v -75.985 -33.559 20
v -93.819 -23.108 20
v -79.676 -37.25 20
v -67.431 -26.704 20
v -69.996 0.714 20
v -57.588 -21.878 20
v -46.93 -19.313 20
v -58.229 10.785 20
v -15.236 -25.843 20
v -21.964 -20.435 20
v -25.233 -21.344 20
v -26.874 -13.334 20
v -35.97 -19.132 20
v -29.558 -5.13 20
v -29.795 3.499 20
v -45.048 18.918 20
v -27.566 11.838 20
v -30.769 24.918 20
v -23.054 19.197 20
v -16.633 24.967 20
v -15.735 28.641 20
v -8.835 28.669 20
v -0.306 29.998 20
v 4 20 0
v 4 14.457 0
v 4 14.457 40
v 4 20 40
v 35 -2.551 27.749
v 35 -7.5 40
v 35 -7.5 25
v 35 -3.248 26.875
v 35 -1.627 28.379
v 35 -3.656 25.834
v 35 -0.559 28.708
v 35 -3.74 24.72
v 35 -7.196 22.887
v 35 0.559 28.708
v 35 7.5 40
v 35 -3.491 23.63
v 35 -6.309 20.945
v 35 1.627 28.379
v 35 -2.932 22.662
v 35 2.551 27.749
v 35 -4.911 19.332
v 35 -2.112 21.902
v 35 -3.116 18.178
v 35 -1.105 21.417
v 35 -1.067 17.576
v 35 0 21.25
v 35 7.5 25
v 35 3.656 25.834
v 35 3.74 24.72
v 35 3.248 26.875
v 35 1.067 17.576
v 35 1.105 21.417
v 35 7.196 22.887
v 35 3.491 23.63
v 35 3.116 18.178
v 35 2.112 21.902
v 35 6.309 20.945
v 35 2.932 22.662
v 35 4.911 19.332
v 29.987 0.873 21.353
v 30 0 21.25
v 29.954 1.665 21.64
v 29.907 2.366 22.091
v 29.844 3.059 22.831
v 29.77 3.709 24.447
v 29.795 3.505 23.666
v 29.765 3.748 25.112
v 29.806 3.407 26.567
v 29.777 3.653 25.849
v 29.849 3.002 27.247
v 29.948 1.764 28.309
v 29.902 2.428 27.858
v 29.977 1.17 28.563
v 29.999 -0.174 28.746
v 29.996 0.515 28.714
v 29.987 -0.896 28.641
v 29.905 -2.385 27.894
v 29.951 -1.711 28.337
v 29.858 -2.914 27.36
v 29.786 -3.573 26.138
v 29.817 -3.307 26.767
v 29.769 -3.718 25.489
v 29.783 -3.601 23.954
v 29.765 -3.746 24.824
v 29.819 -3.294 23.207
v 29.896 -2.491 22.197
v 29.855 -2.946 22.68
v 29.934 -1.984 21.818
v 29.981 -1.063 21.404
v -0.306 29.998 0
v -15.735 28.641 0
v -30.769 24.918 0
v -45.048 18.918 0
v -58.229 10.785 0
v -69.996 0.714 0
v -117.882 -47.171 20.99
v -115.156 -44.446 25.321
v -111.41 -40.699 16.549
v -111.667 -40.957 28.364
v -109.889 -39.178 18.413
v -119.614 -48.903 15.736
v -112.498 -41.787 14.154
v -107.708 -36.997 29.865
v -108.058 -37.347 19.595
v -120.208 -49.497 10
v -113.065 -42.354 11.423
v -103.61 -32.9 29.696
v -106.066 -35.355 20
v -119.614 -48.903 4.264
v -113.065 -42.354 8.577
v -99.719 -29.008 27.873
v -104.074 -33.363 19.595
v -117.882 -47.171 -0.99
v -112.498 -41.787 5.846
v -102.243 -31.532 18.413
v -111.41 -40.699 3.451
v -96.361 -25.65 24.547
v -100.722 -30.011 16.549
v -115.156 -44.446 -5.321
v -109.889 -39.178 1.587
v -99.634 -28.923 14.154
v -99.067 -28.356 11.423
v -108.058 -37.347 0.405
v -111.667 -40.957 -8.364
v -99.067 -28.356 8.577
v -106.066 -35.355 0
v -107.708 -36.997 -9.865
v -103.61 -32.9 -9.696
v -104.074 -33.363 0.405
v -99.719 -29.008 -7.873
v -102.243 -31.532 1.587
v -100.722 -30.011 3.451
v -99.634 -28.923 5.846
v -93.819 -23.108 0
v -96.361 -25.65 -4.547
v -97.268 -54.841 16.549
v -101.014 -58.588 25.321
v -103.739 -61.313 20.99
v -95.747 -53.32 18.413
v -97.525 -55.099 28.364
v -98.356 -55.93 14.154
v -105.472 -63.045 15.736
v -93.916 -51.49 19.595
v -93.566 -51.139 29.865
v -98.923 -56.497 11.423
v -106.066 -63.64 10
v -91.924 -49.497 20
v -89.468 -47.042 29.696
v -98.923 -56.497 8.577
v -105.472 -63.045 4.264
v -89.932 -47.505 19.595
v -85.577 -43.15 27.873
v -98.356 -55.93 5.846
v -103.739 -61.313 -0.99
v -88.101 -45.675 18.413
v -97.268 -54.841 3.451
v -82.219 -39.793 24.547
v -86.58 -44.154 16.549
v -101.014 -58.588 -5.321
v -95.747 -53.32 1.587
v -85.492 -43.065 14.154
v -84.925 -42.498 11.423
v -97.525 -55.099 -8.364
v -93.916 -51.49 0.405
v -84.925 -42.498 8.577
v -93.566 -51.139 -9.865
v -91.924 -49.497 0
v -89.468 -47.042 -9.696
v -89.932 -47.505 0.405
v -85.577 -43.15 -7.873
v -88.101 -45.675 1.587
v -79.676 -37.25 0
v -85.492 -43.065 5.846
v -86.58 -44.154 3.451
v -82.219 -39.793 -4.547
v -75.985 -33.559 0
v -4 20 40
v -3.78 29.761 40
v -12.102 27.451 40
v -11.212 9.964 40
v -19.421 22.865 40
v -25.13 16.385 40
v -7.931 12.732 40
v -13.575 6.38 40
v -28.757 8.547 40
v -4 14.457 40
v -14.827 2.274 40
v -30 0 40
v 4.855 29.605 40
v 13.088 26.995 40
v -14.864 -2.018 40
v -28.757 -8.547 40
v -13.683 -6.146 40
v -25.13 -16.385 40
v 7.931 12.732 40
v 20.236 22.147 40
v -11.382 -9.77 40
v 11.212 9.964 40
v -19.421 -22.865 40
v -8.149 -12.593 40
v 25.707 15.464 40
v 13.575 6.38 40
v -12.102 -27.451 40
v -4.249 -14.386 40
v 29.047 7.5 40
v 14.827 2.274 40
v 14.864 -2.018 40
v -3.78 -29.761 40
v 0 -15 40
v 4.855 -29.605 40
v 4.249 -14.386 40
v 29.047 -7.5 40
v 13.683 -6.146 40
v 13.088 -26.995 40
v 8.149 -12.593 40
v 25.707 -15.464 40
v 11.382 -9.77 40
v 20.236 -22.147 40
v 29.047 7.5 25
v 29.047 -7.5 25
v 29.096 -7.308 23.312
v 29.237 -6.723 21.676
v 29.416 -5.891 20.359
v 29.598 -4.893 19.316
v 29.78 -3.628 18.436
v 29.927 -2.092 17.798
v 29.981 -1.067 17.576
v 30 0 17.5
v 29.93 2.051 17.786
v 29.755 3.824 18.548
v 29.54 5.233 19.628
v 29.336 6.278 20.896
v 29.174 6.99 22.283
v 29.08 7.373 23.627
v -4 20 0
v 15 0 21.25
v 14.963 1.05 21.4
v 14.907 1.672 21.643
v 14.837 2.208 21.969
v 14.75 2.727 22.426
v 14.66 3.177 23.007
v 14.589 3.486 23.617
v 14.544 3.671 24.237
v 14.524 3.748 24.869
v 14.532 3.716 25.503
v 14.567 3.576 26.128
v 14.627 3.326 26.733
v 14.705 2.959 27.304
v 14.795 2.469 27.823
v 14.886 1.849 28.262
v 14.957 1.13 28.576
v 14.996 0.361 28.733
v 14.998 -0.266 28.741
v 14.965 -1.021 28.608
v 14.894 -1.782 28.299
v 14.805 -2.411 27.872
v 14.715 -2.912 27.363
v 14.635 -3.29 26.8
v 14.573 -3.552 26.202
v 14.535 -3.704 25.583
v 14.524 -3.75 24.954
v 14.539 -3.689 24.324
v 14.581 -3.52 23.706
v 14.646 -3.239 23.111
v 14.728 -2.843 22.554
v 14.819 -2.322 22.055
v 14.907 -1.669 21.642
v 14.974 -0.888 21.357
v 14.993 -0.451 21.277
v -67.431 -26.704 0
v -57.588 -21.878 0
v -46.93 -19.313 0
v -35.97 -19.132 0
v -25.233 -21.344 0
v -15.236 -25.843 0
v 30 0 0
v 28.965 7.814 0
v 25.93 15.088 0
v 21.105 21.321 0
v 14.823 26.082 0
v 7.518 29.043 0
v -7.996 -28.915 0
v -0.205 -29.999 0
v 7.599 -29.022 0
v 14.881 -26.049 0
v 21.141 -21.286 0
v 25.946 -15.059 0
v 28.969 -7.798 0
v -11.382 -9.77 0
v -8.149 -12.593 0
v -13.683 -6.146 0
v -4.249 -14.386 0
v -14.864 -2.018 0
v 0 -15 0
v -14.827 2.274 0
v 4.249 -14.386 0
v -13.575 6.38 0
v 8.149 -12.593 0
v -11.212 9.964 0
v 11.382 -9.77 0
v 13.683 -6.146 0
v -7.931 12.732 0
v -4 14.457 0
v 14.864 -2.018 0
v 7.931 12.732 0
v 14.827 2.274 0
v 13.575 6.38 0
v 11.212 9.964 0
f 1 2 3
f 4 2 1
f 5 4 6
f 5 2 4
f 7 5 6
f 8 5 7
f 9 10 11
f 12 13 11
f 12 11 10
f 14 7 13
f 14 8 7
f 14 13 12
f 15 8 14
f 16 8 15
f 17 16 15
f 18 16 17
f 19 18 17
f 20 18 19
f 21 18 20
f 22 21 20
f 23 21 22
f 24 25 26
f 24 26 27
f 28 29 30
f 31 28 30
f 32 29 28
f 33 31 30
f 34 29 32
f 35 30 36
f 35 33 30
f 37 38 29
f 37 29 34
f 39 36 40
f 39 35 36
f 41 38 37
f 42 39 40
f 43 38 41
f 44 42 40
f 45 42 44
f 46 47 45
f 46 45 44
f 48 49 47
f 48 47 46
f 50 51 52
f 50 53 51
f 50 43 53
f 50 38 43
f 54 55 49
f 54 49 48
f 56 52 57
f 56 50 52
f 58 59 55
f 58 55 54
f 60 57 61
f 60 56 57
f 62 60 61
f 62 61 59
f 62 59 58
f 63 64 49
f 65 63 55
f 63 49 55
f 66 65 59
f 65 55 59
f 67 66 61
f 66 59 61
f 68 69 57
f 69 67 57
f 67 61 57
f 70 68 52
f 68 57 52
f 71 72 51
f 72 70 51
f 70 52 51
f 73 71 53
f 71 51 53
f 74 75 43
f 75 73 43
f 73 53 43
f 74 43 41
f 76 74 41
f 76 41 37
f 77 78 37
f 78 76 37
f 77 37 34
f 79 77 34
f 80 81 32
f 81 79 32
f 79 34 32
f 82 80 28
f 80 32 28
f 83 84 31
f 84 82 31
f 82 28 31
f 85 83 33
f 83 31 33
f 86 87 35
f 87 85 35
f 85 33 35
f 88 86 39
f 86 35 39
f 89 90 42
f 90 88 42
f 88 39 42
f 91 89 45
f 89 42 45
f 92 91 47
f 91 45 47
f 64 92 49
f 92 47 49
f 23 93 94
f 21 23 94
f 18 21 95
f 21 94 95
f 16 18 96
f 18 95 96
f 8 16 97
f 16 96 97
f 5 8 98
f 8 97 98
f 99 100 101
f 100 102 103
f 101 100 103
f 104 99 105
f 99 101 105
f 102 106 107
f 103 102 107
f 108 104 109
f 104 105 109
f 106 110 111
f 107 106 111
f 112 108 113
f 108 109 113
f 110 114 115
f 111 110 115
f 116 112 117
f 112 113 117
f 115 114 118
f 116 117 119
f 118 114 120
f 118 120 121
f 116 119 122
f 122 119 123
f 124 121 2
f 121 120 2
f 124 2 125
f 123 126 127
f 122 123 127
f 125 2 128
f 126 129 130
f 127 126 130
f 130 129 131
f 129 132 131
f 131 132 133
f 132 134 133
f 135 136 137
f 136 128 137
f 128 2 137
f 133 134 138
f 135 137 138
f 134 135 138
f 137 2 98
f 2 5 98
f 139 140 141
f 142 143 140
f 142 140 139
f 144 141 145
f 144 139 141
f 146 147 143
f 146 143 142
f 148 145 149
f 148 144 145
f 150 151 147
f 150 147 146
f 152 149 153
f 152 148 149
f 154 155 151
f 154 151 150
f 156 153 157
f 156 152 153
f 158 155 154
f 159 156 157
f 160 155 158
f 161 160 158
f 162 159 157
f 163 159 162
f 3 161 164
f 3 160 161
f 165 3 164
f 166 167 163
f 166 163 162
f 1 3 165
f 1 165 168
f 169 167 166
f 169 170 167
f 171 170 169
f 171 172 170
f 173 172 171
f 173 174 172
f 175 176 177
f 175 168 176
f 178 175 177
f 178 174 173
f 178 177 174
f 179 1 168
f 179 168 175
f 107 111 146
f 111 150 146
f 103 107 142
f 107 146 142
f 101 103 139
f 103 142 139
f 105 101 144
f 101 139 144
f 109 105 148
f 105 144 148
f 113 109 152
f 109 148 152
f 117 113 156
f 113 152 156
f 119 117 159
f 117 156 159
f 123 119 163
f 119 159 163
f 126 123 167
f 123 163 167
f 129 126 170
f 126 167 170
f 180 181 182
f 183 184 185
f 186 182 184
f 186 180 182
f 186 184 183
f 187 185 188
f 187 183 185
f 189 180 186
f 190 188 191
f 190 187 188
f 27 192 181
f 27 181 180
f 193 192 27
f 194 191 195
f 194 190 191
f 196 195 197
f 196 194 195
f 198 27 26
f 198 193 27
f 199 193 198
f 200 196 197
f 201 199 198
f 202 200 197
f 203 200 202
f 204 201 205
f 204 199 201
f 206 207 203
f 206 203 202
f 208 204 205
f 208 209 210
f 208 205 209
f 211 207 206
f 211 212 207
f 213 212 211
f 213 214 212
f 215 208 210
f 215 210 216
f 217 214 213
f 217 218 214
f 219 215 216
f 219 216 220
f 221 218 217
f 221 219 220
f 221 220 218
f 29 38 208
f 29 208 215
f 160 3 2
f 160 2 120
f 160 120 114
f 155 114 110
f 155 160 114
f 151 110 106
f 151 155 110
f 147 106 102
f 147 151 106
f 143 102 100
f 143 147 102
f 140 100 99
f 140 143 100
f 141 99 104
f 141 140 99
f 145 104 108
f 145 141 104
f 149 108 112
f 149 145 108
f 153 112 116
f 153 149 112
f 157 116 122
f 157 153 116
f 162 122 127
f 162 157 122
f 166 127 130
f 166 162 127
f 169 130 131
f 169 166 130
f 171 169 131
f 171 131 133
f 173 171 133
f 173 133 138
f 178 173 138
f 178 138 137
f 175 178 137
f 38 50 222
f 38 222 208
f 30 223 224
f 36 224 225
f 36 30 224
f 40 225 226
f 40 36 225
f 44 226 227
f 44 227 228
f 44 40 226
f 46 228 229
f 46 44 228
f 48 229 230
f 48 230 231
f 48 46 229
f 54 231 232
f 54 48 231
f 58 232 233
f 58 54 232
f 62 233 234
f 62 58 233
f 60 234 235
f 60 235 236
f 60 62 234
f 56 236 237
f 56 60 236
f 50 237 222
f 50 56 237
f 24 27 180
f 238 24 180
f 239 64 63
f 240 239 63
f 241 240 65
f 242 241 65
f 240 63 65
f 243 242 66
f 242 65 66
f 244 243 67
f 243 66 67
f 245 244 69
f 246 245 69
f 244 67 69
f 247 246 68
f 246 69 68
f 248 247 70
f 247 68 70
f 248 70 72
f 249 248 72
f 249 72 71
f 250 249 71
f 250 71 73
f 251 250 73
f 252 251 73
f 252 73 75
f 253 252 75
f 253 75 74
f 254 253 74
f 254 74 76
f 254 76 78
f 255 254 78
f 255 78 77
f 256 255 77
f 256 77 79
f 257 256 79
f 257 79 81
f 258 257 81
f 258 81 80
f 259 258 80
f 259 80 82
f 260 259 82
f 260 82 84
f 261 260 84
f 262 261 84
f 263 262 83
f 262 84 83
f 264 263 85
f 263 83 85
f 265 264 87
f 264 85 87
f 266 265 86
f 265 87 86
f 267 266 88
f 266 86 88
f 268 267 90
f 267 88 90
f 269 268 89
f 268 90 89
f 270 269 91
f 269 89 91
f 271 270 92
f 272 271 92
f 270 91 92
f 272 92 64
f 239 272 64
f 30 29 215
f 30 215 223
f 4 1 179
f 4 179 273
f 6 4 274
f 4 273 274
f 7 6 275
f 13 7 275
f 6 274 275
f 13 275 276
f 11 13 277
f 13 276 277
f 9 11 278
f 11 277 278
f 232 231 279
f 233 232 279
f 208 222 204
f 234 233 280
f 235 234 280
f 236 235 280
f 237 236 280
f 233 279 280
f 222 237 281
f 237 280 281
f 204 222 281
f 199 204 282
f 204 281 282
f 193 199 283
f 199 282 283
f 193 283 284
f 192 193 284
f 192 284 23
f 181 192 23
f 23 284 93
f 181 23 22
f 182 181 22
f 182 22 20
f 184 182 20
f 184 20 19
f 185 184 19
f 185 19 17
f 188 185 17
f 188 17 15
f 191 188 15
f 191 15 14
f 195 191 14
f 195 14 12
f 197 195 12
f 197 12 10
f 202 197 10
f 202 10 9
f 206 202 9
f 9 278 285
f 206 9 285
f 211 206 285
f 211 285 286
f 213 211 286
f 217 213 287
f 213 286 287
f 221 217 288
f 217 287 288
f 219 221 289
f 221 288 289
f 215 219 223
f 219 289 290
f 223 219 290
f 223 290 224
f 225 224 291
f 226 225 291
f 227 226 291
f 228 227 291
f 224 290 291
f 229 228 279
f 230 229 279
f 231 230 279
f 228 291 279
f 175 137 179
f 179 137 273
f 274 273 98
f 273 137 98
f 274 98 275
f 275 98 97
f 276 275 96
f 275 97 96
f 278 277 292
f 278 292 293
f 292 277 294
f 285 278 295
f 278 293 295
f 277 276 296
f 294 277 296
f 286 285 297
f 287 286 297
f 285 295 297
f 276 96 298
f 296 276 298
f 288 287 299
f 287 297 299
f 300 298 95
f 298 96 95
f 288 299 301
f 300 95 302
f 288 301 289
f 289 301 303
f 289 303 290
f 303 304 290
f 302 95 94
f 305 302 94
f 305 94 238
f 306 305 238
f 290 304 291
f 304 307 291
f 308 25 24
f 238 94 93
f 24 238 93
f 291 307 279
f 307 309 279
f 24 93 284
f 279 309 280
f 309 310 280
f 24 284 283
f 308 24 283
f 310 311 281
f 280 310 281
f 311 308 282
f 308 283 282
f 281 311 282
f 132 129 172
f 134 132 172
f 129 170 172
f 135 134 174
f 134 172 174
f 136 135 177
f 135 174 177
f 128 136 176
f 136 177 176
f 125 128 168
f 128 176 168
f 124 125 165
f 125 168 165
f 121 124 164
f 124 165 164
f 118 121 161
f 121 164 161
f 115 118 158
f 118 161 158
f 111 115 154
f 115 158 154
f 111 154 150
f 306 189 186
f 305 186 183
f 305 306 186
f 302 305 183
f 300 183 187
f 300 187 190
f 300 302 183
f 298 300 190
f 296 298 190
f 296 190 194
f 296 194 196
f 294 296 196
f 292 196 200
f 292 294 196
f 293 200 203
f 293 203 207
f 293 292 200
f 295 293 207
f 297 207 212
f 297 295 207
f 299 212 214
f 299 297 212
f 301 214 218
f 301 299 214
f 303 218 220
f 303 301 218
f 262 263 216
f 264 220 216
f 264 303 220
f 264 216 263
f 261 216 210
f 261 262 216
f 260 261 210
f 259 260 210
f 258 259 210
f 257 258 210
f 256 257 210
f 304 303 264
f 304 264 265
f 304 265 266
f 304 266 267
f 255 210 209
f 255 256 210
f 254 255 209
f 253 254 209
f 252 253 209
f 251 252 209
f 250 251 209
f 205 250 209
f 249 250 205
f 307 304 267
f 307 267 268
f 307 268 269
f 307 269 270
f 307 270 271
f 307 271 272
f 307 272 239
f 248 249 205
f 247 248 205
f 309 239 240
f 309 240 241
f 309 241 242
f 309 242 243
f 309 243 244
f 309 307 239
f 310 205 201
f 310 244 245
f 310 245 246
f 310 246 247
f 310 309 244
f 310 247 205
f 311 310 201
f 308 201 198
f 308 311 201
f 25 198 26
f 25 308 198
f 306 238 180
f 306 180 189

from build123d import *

# Parameters (mm, degrees)
SKETCH_1_R           = 30
EXTRUDE_1_DEPTH      = 40
EXTRUDE_2_DEPTH      = 20
SKETCH_2_R           = 20
SKETCH_2_R_2         = 10
EXTRUDE_3_DEPTH      = 20
CUT_EXTRUDE_1_DEPTH  = 20
EXTRUDE_4_REACH      = 174.452
EXTRUDE_4_END_RADIUS = 30
SKETCH_3_R           = 3.75
CUT_EXTRUDE_2_REACH  = 174.452
SKETCH_3_2_R         = 3.75


with BuildPart() as part:
    # 草图1 → 凸台-拉伸1 (new body)
    with BuildSketch(Plane.XY):
        Circle(SKETCH_1_R)
        with BuildLine():
            ThreePointArc((-4, 14.456832295), (0, -15), (4, 14.456832295))
            Line((4, 14.456832295), (4, 20))
            Line((4, 20), (-4, 20))
            Line((-4, 20), (-4, 14.456832295))
        make_face(mode=Mode.SUBTRACT)
    extrude(amount=EXTRUDE_1_DEPTH)

    # 草图1<3> → 凸台-拉伸2 (add)
    with BuildSketch(Plane.XY):
        with BuildLine():
            Line((-69.996355211, 0.714322908), (-106.066017178, -35.355339059))
            Line((-106.066017178, -35.355339059), (-91.923881554, -49.497474683))
            Line((-91.923881554, -49.497474683), (-75.985459186, -33.559052315))
            ThreePointArc((-75.985459186, -33.559052315), (-46.930334751, -19.312906561), (-15.236295048, -25.842896765))
            ThreePointArc((-15.236295048, -25.842896765), (-28.981985351, 7.748840242), (-0.306138389, 29.998437947))
            ThreePointArc((-0.306138389, 29.998437947), (-38.024919972, 22.195136051), (-69.996355211, 0.714322908))
        make_face()
    extrude(amount=EXTRUDE_2_DEPTH)

    # 草图2 → 凸台-拉伸3 (add)
    with BuildSketch(Plane(origin=(-21.213203436, 21.213203436, 0), x_dir=(0, 0, -1), z_dir=(0.7071067811865452, -0.7071067811865498, 0))):
        with Locations((-10, -100)):
            Circle(SKETCH_2_R)
        with Locations((-10, -100)):
            Circle(SKETCH_2_R_2, mode=Mode.SUBTRACT)
    extrude(amount=-EXTRUDE_3_DEPTH)

    # 草图2<3> → 切除-拉伸1 (cut)
    with BuildSketch(Plane(origin=(-21.213203436, 21.213203436, 0), x_dir=(0, 0, -1), z_dir=(0.7071067811865452, -0.7071067811865498, 0))):
        with BuildLine():
            Line((-20, -100), (0, -100))
            ThreePointArc((0, -100), (-10, -90), (-20, -100))
        make_face()
        with BuildLine():
            ThreePointArc((-20, -100), (-10, -110), (0, -100))
            Line((0, -100), (-20, -100))
        make_face()
    extrude(amount=-CUT_EXTRUDE_1_DEPTH, mode=Mode.SUBTRACT)

    # 凸台-拉伸4: up to this cylinder (the profile starts outside it)
    extrude_4_end = Plane(origin=(0, 0, 30.224226), z_dir=(0, 0, -1)) * Cylinder(EXTRUDE_4_END_RADIUS, 409.904, mode=Mode.PRIVATE)
    # 草图3 → 凸台-拉伸4 (add, up to the surface)
    with BuildSketch(Plane(origin=(35, 0, 0), x_dir=(0, 0, -1), z_dir=(1, 0, 0)), mode=Mode.PRIVATE) as extrude_4_sk1:
        with BuildLine():
            Line((-25, 7.5), (-40, 7.5))
            Line((-40, 7.5), (-40, -7.5))
            Line((-40, -7.5), (-25, -7.5))
            ThreePointArc((-25, -7.5), (-17.5, 0), (-25, 7.5))
        make_face()
        with Locations((-25, 0)):
            Circle(SKETCH_3_R, mode=Mode.SUBTRACT)
    extrude_4_tool1 = extrude(extrude_4_sk1.sketch, amount=-EXTRUDE_4_REACH, mode=Mode.PRIVATE) - extrude_4_end
    add(extrude_4_tool1.solids().sort_by_distance((35, 0, 30.224226))[0])

    # 草图3<2> → 切除-拉伸2 (cut, up to next)
    with BuildSketch(Plane(origin=(35, 0, 0), x_dir=(0, 0, -1), z_dir=(1, 0, 0)), mode=Mode.PRIVATE) as cut_extrude_2_sk1:
        with Locations((-25, 0)):
            Circle(SKETCH_3_2_R)
    cut_extrude_2_tool1 = extrude(cut_extrude_2_sk1.sketch, amount=-CUT_EXTRUDE_2_REACH, mode=Mode.PRIVATE) & part.part
    add(cut_extrude_2_tool1.solids().sort_by_distance((35, 0, 25))[0], mode=Mode.SUBTRACT)


solid = part.part
